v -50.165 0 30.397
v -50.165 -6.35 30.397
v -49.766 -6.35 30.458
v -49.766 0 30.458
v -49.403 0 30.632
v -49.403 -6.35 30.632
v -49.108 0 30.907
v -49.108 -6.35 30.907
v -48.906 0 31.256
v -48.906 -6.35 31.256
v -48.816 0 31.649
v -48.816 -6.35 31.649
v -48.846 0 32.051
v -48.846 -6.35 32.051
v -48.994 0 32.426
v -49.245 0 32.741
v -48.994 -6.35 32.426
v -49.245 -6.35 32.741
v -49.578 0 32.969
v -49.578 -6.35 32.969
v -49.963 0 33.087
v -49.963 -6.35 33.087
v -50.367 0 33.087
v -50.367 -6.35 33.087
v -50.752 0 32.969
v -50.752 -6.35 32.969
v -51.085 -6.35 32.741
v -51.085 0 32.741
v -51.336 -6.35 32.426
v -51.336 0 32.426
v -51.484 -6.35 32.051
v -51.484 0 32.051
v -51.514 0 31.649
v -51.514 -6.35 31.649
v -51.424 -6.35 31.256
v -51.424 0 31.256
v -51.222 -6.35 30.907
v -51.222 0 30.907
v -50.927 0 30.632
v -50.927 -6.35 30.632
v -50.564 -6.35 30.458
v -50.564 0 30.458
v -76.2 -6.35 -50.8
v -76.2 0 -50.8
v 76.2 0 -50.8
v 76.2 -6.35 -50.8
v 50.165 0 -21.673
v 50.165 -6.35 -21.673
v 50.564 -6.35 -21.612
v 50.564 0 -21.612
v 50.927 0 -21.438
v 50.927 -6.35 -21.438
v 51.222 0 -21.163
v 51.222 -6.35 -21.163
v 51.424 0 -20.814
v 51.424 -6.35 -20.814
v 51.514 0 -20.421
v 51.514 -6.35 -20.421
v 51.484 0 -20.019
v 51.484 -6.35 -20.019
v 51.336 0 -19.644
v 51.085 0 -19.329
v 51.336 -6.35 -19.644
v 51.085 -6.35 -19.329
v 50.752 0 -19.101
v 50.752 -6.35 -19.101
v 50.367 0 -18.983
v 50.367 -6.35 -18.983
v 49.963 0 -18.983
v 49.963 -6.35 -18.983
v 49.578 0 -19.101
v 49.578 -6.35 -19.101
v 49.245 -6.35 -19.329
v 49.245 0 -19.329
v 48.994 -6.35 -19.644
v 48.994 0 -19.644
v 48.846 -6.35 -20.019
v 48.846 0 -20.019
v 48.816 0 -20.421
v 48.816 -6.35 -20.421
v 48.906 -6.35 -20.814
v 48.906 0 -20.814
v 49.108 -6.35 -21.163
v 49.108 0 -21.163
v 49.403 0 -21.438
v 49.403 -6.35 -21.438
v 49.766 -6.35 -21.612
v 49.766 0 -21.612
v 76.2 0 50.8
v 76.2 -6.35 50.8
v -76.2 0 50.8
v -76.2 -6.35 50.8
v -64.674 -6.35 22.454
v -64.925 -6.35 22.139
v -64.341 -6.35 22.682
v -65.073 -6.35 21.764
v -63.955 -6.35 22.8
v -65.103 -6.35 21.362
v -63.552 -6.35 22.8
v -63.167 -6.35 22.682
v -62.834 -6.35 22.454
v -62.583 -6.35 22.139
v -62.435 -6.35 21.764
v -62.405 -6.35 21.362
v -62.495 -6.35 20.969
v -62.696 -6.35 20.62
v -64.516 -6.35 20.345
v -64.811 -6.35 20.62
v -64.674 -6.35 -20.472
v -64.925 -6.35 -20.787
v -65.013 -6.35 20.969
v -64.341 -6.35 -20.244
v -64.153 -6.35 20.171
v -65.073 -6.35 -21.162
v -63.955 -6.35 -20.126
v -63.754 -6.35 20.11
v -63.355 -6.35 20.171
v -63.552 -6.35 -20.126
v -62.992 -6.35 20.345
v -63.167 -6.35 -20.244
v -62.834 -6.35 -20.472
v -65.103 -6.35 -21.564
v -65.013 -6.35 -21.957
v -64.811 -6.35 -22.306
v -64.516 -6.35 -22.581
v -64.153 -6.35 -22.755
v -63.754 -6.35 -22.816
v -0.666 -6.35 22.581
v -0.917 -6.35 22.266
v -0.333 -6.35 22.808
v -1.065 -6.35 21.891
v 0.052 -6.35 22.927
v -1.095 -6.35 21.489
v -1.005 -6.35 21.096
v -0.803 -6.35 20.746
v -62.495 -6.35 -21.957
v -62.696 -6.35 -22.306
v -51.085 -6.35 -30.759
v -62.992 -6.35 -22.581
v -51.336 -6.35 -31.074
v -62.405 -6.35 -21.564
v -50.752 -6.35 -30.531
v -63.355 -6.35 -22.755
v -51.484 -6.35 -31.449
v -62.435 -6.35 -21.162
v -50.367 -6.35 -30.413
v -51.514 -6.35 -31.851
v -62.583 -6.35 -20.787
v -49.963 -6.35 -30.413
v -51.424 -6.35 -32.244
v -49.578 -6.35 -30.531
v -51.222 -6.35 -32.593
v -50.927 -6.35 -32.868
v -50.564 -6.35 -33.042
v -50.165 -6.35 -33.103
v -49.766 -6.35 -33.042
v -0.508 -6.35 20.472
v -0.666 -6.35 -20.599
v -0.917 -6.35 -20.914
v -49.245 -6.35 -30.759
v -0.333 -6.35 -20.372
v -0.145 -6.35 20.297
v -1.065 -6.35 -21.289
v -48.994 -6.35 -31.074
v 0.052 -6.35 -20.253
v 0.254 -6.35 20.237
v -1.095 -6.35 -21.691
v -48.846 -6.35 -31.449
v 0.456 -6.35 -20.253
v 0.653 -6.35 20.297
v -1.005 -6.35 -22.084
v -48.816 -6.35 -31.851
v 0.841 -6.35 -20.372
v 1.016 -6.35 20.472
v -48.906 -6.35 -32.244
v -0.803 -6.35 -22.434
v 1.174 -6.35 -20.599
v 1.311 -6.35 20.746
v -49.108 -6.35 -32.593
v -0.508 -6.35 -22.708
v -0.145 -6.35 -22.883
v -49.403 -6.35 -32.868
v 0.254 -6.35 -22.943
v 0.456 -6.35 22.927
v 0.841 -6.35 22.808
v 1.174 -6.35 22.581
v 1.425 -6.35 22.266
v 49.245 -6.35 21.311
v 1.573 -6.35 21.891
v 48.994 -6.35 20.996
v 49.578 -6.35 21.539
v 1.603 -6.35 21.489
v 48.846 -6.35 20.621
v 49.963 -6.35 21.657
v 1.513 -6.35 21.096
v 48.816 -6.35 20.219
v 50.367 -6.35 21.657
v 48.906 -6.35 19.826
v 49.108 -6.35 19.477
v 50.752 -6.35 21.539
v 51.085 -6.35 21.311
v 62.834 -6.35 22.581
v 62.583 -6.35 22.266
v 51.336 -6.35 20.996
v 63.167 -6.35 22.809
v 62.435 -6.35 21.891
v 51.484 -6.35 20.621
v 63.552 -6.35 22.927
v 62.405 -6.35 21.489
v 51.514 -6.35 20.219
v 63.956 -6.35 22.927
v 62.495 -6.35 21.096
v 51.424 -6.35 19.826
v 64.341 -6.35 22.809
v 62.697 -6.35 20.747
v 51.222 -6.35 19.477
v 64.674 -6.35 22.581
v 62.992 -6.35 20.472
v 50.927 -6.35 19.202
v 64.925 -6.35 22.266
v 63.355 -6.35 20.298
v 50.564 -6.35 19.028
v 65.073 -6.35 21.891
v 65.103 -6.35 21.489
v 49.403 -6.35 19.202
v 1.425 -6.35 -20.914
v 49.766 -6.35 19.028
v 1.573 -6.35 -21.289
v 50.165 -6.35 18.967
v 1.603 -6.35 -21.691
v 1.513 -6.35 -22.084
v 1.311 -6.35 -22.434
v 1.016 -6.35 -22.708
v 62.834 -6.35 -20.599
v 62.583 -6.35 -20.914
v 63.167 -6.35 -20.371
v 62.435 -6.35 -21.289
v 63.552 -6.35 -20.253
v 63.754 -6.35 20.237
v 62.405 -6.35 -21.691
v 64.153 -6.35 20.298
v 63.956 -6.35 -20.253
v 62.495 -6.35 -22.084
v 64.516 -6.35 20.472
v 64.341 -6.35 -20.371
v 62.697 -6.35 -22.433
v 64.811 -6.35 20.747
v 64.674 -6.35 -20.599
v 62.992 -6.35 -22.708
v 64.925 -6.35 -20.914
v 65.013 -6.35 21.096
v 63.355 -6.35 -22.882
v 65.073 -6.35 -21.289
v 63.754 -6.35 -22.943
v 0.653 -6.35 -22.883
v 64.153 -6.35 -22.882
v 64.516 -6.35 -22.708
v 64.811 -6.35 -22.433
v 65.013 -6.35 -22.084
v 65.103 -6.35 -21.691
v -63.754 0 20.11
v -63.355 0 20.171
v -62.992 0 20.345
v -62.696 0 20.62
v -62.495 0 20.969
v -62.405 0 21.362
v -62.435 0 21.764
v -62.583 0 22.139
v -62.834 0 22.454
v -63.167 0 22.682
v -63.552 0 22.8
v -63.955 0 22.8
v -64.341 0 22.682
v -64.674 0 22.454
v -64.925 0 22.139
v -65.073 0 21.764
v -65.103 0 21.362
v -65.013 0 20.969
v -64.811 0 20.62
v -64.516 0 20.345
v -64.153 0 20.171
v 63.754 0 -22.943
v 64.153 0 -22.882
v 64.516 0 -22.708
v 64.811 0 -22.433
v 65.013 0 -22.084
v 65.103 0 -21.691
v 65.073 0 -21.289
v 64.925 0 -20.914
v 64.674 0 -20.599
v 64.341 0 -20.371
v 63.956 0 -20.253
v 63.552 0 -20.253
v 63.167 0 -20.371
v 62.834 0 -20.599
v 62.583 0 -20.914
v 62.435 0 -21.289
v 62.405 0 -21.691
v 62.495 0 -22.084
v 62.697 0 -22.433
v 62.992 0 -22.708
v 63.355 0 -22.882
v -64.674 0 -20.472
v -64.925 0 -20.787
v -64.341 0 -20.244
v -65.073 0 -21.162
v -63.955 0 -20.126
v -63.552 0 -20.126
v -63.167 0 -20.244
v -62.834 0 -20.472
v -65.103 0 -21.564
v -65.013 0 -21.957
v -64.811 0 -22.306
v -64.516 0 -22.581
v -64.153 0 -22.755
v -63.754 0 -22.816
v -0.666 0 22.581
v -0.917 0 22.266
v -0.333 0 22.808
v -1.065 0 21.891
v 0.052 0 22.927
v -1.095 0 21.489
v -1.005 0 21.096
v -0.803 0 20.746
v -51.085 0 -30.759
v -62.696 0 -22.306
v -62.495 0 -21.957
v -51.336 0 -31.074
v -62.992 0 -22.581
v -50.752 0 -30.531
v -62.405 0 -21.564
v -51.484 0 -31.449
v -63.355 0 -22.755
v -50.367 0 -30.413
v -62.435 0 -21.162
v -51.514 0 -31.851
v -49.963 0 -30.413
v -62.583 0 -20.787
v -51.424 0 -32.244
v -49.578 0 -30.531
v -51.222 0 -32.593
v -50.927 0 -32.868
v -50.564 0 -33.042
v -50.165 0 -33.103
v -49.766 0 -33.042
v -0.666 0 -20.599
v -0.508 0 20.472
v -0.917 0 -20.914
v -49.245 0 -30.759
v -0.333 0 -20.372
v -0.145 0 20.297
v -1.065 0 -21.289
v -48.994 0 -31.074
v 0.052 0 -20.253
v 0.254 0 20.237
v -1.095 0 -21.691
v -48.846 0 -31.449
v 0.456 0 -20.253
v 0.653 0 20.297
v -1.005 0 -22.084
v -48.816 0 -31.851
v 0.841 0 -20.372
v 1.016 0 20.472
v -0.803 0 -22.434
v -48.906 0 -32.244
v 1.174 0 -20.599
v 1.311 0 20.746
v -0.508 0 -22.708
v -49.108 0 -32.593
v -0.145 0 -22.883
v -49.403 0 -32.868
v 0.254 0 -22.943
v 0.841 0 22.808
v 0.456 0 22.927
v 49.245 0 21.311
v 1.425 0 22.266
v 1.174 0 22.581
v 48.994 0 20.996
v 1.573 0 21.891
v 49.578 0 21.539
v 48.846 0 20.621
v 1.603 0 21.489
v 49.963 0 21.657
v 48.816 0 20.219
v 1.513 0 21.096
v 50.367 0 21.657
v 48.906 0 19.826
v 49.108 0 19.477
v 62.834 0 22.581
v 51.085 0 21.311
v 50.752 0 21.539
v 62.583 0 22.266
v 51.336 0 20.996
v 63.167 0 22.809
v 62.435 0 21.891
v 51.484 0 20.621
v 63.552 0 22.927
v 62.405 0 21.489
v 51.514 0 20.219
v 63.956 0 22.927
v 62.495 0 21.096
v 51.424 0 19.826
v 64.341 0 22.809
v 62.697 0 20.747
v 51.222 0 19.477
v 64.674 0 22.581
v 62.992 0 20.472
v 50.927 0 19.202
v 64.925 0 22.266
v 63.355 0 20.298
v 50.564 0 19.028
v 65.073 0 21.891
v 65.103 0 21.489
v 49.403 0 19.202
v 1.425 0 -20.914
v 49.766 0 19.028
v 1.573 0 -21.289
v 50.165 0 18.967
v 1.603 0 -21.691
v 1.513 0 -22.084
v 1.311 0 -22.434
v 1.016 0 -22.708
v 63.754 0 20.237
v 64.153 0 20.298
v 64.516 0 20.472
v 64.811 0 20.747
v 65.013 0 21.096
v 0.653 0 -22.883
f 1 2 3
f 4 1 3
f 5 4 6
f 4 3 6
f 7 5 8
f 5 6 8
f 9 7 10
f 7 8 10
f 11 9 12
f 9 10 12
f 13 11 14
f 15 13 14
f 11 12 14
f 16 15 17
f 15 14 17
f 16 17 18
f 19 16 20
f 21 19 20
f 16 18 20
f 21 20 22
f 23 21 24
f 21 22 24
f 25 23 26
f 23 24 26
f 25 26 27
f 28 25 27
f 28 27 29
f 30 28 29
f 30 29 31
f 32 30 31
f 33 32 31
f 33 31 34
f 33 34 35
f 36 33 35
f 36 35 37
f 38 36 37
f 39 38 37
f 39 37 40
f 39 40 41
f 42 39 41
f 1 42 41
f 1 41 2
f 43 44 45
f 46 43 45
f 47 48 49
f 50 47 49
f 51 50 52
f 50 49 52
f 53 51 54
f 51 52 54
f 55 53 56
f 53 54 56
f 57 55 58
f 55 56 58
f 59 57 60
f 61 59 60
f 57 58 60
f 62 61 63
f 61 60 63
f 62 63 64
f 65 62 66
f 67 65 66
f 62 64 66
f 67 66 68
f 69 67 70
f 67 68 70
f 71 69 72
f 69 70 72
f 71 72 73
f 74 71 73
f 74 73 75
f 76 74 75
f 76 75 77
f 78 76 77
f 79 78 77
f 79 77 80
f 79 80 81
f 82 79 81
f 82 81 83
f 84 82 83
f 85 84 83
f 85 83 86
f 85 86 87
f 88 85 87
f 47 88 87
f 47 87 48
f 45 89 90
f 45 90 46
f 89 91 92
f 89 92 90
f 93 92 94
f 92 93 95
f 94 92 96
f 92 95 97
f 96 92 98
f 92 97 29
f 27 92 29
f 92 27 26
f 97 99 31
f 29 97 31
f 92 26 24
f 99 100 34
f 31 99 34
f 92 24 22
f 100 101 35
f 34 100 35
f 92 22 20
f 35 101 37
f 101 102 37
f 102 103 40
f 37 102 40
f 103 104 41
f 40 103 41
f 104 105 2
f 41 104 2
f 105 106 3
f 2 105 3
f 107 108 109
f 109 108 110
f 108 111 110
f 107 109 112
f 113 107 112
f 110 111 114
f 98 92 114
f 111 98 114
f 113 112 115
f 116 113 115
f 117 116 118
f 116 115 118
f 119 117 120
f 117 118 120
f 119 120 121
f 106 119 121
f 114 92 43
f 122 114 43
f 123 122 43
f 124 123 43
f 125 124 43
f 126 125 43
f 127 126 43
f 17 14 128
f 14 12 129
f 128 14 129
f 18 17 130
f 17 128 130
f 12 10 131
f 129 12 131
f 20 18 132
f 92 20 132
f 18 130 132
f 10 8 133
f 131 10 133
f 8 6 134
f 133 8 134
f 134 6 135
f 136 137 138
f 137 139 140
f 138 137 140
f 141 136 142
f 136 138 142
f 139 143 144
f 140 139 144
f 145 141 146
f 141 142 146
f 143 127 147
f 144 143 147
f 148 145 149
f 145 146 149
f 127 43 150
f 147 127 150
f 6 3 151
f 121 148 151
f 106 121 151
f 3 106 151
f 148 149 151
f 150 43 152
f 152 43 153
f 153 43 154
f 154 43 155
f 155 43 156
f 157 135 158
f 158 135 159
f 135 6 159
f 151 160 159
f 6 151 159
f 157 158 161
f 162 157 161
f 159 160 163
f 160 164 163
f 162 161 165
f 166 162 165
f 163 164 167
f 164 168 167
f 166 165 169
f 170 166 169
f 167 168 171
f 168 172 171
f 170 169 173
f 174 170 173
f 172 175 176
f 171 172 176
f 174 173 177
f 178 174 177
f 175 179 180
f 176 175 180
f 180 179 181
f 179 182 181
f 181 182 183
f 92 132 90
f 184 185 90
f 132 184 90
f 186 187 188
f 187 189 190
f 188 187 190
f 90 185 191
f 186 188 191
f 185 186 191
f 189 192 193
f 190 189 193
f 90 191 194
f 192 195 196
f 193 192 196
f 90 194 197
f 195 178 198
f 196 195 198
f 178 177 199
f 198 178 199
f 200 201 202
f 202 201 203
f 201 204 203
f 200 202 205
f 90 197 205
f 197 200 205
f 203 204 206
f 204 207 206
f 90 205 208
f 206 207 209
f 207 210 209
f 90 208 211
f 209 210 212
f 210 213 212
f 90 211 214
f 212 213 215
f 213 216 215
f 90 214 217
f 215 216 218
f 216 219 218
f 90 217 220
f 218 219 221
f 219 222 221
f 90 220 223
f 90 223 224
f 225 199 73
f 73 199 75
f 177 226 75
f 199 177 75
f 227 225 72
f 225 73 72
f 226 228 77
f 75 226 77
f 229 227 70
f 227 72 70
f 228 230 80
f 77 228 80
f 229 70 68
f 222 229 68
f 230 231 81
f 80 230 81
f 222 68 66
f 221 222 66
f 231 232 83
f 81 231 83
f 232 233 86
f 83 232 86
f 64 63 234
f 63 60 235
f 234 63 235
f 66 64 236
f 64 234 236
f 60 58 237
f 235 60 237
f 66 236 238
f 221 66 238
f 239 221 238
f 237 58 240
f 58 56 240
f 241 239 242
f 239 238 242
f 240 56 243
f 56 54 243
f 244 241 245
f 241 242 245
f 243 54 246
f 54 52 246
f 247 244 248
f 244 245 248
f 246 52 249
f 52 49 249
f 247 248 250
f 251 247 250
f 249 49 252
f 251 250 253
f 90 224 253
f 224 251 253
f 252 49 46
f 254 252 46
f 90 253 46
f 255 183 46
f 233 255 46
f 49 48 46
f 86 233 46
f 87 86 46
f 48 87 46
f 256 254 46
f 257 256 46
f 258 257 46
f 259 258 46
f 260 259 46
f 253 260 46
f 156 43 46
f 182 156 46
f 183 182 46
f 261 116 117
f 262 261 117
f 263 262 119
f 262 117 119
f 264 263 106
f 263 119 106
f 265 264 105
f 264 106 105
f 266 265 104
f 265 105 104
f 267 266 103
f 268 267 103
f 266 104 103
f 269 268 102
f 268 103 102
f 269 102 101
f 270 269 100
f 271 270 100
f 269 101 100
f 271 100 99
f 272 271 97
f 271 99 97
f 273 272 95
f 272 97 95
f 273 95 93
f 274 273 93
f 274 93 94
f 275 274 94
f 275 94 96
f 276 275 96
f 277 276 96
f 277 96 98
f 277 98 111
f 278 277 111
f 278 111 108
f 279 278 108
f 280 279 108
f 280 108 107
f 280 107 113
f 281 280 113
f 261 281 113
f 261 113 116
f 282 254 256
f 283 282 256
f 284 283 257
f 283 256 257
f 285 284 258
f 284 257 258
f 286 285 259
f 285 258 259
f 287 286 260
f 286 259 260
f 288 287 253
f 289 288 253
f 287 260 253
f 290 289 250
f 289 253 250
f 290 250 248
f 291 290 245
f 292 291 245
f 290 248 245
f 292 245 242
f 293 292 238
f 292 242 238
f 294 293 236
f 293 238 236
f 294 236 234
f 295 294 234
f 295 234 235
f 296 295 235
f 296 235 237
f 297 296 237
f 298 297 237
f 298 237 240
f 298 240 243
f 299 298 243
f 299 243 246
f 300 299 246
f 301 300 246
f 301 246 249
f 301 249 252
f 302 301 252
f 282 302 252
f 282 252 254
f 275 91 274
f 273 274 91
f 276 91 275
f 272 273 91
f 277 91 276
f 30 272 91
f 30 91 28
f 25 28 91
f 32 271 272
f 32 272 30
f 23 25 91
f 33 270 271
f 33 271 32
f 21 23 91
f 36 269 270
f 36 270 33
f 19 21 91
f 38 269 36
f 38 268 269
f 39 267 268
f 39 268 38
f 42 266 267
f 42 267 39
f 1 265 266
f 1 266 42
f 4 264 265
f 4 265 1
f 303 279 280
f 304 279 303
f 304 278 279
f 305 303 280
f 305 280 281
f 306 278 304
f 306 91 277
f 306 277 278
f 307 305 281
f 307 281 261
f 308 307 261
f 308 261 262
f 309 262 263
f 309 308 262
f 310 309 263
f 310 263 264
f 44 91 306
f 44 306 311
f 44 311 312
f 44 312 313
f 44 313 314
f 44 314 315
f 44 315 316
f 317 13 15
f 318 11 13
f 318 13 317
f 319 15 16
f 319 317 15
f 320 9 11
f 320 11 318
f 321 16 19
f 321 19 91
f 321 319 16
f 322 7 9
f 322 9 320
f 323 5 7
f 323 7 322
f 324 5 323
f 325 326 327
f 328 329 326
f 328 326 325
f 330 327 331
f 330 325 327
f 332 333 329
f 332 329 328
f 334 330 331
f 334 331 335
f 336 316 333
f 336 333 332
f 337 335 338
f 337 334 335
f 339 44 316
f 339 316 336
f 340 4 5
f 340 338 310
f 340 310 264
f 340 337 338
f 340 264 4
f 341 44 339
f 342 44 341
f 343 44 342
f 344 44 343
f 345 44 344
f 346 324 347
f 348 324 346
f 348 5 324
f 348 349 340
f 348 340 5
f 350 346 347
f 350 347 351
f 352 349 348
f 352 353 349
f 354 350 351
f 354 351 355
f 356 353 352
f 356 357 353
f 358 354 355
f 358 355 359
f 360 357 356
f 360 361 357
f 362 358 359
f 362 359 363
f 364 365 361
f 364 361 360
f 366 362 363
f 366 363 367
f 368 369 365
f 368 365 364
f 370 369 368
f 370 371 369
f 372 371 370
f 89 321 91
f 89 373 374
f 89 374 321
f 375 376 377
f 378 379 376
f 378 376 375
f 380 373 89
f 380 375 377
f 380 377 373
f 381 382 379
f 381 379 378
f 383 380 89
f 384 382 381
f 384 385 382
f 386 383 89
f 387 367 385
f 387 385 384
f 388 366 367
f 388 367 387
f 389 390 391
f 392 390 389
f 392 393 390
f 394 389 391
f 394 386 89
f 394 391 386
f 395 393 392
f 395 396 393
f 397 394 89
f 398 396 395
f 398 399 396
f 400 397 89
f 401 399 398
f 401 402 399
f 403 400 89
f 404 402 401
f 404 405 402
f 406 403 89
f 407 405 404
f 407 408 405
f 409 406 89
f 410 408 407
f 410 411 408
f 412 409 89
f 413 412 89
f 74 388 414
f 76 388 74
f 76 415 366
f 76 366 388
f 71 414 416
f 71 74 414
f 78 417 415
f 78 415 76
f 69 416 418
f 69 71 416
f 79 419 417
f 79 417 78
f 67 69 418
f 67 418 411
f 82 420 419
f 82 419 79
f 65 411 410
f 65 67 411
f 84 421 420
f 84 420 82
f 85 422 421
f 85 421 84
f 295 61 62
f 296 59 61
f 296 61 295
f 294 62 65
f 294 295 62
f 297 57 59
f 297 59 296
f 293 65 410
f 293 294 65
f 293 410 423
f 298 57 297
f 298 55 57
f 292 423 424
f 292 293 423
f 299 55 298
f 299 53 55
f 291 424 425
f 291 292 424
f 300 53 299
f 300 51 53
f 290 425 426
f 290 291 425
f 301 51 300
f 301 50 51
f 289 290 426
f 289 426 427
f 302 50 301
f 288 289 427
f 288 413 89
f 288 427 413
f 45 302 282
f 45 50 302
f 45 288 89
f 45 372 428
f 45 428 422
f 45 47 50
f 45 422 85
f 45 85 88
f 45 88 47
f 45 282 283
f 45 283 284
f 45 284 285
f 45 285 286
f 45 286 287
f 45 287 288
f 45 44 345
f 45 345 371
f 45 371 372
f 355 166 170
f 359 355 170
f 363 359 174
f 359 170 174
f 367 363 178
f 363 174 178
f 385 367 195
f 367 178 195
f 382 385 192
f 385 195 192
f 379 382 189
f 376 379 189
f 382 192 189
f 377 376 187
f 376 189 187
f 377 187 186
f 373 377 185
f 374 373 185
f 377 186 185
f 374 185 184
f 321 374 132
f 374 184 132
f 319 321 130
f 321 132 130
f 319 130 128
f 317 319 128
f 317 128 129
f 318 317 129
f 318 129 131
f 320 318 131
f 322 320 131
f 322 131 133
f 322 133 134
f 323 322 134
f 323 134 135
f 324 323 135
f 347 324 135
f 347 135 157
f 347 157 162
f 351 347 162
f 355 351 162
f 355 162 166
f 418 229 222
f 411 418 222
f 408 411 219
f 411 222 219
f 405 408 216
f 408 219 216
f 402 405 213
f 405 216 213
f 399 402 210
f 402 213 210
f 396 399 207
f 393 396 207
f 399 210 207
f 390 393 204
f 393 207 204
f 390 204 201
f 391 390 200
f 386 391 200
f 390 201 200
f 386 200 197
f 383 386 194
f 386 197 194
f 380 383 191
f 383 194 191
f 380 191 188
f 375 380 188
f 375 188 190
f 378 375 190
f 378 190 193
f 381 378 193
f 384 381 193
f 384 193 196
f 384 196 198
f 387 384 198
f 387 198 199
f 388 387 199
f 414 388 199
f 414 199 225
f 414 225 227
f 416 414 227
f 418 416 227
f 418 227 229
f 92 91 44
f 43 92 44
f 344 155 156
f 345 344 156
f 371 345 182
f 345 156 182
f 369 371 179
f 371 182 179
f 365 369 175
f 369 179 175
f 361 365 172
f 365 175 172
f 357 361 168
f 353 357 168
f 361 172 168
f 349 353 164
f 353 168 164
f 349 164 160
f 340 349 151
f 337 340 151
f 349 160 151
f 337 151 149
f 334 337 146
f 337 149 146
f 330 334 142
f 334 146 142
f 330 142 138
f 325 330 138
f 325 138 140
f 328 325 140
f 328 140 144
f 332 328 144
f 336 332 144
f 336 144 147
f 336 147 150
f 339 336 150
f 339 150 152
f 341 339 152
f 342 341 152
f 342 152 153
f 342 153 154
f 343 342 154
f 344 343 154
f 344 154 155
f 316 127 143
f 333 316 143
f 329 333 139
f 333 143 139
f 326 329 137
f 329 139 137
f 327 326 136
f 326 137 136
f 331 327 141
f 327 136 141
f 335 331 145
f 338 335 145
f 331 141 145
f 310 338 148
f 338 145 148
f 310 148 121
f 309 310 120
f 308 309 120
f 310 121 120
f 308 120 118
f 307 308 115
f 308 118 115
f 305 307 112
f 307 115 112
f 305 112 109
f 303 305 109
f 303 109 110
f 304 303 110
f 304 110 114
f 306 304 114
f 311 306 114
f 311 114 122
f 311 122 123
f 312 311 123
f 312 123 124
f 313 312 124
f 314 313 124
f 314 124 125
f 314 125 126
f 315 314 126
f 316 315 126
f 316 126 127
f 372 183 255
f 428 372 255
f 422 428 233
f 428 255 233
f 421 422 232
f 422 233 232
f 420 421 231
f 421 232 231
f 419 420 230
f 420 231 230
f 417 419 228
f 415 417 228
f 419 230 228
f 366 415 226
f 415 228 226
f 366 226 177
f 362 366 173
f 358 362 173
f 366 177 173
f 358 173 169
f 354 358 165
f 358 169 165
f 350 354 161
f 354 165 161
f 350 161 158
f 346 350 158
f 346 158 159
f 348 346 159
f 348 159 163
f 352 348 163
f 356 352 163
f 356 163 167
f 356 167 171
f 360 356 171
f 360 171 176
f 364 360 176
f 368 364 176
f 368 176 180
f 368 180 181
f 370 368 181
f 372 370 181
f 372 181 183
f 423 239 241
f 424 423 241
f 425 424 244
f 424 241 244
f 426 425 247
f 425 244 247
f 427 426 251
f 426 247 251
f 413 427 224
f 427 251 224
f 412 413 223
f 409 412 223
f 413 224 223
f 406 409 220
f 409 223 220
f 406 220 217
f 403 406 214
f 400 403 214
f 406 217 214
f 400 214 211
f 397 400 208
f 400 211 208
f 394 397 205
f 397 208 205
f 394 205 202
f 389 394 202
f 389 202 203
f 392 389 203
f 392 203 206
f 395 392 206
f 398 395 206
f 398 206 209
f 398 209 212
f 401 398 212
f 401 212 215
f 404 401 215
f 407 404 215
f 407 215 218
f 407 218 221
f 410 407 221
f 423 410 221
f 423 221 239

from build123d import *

# Parameters (mm, degrees)
SKETCH1_W                 = 152.4
SKETCH1_H                 = 101.6
SKETCH1_W_2               = 127.508
SKETCH1_H_2               = 42.926
SKETCH1_W_3               = 64.008
SKETCH1_W_4               = 63.5
BOSS_EXTRUDE1_DEPTH       = 6.35
TAP_DRILL_FOR_6_32_TAP2_D = 2.7051
TAP_DRILL_FOR_6_32_TAP5_D = 2.7051


with BuildPart() as part:
    # Sketch1 → Boss-Extrude1 (new body)
    # profile 1 of 3: a face of its own
    with BuildSketch(Plane(origin=(0, 0, 0), x_dir=(1, 0, 0), z_dir=(0, 1, 0))):
        Rectangle(SKETCH1_W, SKETCH1_H)
        Rectangle(SKETCH1_W_2, SKETCH1_H_2, mode=Mode.SUBTRACT)
    # profile 2 of 3: a face of its own
    with BuildSketch(Plane(origin=(0, 0, 0), x_dir=(1, 0, 0), z_dir=(0, 1, 0))):
        with Locations((-31.75, 0)):
            Rectangle(SKETCH1_W_3, SKETCH1_H_2)
    # profile 3 of 3: a face of its own
    with BuildSketch(Plane(origin=(0, 0, 0), x_dir=(1, 0, 0), z_dir=(0, 1, 0))):
        with Locations((32.004, 0)):
            Rectangle(SKETCH1_W_4, SKETCH1_H_2)
    extrude(amount=-BOSS_EXTRUDE1_DEPTH)

    # Tap Drill for #6-32 Tap2 (through all)
    with Locations(Plane(origin=(-63.753873504, 0, -21.463), x_dir=(0, 0, 1), z_dir=(0, 1, 0))):
        with Locations((0, 0), (-0.1272545, 64.007873503), (-0.127, 127.507873502), (43.053, 127.507873502), (43.0527455, 64.007873503), (42.926, 0)):
            Hole(TAP_DRILL_FOR_6_32_TAP2_D / 2)

    # Tap Drill for #6-32 Tap5 (through all)
    with Locations(Plane(origin=(-50.165, 0, -31.75), x_dir=(0, 0, 1), z_dir=(0, 1, 0))):
        with Locations((0, 0), (63.5, 0), (52.07, 100.33), (11.43, 100.33)):
            Hole(TAP_DRILL_FOR_6_32_TAP5_D / 2)


solid = part.part
